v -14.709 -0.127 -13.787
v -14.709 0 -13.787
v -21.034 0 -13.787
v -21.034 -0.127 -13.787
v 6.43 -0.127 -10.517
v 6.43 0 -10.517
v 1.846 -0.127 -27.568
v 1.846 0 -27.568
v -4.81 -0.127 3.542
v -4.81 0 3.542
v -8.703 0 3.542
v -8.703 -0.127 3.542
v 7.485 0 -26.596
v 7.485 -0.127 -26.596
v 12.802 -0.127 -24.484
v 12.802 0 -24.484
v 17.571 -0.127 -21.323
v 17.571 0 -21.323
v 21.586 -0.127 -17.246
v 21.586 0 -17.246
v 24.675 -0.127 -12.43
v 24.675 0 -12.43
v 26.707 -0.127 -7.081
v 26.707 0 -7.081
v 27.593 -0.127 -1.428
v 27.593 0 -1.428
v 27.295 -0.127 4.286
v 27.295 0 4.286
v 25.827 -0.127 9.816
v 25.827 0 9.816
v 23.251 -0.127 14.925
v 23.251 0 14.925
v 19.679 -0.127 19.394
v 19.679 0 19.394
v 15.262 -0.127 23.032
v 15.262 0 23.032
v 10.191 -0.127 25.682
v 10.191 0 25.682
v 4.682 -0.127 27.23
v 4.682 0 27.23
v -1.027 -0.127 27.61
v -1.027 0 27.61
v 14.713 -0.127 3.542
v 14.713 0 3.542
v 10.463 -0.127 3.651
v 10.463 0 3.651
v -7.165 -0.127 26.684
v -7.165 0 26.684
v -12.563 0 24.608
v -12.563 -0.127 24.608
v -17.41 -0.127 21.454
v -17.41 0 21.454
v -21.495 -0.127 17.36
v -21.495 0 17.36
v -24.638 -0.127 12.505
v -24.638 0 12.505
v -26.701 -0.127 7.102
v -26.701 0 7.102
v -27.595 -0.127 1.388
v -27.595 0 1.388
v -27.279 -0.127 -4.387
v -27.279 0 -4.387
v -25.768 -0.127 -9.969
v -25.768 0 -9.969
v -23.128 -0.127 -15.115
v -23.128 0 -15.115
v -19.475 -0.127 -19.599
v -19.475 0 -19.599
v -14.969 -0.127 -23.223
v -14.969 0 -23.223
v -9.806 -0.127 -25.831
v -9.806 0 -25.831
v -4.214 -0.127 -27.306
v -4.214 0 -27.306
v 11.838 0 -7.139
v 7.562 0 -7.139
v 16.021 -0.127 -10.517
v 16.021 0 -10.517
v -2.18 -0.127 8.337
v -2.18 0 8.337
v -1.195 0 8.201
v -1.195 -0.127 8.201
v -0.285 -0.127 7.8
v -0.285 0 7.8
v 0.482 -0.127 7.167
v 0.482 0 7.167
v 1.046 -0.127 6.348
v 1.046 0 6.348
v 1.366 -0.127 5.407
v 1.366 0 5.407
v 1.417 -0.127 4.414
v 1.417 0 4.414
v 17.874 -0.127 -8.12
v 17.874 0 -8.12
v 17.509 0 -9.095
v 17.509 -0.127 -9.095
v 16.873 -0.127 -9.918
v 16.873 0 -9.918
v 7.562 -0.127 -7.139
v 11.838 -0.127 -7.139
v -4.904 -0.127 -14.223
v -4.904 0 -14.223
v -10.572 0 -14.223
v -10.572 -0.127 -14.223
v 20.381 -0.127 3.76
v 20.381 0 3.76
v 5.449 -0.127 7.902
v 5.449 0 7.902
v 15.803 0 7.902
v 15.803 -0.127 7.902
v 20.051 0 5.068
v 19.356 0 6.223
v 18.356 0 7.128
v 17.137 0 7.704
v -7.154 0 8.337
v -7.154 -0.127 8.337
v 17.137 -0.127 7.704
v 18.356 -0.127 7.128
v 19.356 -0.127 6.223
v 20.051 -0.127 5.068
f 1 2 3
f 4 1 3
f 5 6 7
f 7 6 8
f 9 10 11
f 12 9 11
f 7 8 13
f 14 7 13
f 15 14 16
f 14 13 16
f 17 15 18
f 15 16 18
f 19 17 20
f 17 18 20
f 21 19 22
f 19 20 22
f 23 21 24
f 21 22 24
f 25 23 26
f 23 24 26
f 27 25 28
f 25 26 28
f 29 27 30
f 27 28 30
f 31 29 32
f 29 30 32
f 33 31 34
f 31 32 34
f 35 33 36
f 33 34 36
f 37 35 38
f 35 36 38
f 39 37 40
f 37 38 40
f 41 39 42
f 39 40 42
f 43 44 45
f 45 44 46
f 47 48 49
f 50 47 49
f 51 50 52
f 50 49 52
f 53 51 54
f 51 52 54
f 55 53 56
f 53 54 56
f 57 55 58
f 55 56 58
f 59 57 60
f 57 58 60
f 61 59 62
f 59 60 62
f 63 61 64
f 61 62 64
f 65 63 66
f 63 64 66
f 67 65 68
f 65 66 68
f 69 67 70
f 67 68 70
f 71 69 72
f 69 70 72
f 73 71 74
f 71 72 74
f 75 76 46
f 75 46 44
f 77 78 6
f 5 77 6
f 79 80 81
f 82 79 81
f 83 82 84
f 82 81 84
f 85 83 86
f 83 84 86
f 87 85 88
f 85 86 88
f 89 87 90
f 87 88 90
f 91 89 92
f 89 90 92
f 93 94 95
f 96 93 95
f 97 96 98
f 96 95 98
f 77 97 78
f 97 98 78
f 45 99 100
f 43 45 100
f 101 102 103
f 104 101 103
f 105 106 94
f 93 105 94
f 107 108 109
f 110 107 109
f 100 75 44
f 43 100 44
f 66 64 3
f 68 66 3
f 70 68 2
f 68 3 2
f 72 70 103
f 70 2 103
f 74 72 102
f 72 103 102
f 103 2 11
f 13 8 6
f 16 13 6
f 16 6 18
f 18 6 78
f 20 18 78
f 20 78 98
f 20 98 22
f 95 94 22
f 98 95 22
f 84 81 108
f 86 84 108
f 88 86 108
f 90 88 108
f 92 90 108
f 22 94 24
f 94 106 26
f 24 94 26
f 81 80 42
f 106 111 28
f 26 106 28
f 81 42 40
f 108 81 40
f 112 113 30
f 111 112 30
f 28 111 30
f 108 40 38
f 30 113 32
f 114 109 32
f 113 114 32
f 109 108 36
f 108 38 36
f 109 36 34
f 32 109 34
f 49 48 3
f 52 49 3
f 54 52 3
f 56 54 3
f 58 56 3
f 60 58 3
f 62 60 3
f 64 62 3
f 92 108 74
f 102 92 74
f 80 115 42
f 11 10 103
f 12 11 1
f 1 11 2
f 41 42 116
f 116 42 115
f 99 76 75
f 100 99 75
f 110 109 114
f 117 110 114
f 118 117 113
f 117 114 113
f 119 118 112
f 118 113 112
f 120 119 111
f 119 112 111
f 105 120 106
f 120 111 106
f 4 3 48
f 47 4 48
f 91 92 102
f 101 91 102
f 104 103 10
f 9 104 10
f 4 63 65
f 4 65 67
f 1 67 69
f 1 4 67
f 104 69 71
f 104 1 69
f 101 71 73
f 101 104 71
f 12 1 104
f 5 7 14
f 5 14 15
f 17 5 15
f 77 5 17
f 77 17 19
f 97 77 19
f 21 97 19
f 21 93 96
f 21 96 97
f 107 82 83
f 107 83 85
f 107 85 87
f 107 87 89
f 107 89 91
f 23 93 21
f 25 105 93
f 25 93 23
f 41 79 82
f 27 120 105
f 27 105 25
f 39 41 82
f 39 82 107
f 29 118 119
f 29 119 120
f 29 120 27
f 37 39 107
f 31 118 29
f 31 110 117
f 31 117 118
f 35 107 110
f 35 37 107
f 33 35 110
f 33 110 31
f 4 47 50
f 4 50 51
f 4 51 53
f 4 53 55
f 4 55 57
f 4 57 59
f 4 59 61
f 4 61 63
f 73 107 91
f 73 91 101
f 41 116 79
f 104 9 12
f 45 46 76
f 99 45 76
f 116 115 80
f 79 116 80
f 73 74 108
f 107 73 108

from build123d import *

# Parameters (mm, degrees)
F1_DEPTH = 0.127


with BuildPart() as f1:
    # F0 (on Front) → F1 (new body)
    with BuildSketch(Plane.XZ):
        with BuildLine():
            Line((-8.702541, 3.542074), (-14.70889, -13.786842))
            Line((-14.70889, -13.786842), (-21.03447, -13.786842))
            Line((-21.03447, -13.786842), (-7.164713, 26.684349))
            ThreePointArc((-7.164713, 26.684349), (-27.588302, -1.507698), (-4.214135, -27.306202))
            Line((-4.214135, -27.306202), (5.449344, 7.901549))
            Line((5.449344, 7.901549), (15.803101, 7.901549))
            ThreePointArc((15.803101, 7.901549), (18.889566, 6.712512), (20.380549, 3.760048))
            Line((20.380549, 3.760048), (17.873852, -8.119524))
            ThreePointArc((17.873852, -8.119524), (17.221807, -9.530373), (16.021073, -10.517235))
            Line((16.021073, -10.517235), (6.430227, -10.517235))
            Line((6.430227, -10.517235), (1.845814, -27.567745))
            ThreePointArc((1.845814, -27.567745), (27.592102, 1.436488), (-1.026846, 27.610381))
            Line((-1.026846, 27.610381), (-7.153734, 8.337497))
            Line((-7.153734, 8.337497), (-2.179738, 8.337497))
            ThreePointArc((-2.179738, 8.337497), (0.481529, 7.166801), (1.41683, 4.413969))
            Line((1.41683, 4.413969), (-4.904409, -14.22279))
            Line((-4.904409, -14.22279), (-10.571728, -14.22279))
            Line((-10.571728, -14.22279), (-4.810151, 3.542074))
            Line((-4.810151, 3.542074), (-8.702541, 3.542074))
        make_face()
        Polygon((11.837652, -7.138641), (14.71323, 3.542074), (10.462743, 3.651061), (7.561689, -7.138641), align=None)
    extrude(amount=F1_DEPTH)


solid = f1.part
